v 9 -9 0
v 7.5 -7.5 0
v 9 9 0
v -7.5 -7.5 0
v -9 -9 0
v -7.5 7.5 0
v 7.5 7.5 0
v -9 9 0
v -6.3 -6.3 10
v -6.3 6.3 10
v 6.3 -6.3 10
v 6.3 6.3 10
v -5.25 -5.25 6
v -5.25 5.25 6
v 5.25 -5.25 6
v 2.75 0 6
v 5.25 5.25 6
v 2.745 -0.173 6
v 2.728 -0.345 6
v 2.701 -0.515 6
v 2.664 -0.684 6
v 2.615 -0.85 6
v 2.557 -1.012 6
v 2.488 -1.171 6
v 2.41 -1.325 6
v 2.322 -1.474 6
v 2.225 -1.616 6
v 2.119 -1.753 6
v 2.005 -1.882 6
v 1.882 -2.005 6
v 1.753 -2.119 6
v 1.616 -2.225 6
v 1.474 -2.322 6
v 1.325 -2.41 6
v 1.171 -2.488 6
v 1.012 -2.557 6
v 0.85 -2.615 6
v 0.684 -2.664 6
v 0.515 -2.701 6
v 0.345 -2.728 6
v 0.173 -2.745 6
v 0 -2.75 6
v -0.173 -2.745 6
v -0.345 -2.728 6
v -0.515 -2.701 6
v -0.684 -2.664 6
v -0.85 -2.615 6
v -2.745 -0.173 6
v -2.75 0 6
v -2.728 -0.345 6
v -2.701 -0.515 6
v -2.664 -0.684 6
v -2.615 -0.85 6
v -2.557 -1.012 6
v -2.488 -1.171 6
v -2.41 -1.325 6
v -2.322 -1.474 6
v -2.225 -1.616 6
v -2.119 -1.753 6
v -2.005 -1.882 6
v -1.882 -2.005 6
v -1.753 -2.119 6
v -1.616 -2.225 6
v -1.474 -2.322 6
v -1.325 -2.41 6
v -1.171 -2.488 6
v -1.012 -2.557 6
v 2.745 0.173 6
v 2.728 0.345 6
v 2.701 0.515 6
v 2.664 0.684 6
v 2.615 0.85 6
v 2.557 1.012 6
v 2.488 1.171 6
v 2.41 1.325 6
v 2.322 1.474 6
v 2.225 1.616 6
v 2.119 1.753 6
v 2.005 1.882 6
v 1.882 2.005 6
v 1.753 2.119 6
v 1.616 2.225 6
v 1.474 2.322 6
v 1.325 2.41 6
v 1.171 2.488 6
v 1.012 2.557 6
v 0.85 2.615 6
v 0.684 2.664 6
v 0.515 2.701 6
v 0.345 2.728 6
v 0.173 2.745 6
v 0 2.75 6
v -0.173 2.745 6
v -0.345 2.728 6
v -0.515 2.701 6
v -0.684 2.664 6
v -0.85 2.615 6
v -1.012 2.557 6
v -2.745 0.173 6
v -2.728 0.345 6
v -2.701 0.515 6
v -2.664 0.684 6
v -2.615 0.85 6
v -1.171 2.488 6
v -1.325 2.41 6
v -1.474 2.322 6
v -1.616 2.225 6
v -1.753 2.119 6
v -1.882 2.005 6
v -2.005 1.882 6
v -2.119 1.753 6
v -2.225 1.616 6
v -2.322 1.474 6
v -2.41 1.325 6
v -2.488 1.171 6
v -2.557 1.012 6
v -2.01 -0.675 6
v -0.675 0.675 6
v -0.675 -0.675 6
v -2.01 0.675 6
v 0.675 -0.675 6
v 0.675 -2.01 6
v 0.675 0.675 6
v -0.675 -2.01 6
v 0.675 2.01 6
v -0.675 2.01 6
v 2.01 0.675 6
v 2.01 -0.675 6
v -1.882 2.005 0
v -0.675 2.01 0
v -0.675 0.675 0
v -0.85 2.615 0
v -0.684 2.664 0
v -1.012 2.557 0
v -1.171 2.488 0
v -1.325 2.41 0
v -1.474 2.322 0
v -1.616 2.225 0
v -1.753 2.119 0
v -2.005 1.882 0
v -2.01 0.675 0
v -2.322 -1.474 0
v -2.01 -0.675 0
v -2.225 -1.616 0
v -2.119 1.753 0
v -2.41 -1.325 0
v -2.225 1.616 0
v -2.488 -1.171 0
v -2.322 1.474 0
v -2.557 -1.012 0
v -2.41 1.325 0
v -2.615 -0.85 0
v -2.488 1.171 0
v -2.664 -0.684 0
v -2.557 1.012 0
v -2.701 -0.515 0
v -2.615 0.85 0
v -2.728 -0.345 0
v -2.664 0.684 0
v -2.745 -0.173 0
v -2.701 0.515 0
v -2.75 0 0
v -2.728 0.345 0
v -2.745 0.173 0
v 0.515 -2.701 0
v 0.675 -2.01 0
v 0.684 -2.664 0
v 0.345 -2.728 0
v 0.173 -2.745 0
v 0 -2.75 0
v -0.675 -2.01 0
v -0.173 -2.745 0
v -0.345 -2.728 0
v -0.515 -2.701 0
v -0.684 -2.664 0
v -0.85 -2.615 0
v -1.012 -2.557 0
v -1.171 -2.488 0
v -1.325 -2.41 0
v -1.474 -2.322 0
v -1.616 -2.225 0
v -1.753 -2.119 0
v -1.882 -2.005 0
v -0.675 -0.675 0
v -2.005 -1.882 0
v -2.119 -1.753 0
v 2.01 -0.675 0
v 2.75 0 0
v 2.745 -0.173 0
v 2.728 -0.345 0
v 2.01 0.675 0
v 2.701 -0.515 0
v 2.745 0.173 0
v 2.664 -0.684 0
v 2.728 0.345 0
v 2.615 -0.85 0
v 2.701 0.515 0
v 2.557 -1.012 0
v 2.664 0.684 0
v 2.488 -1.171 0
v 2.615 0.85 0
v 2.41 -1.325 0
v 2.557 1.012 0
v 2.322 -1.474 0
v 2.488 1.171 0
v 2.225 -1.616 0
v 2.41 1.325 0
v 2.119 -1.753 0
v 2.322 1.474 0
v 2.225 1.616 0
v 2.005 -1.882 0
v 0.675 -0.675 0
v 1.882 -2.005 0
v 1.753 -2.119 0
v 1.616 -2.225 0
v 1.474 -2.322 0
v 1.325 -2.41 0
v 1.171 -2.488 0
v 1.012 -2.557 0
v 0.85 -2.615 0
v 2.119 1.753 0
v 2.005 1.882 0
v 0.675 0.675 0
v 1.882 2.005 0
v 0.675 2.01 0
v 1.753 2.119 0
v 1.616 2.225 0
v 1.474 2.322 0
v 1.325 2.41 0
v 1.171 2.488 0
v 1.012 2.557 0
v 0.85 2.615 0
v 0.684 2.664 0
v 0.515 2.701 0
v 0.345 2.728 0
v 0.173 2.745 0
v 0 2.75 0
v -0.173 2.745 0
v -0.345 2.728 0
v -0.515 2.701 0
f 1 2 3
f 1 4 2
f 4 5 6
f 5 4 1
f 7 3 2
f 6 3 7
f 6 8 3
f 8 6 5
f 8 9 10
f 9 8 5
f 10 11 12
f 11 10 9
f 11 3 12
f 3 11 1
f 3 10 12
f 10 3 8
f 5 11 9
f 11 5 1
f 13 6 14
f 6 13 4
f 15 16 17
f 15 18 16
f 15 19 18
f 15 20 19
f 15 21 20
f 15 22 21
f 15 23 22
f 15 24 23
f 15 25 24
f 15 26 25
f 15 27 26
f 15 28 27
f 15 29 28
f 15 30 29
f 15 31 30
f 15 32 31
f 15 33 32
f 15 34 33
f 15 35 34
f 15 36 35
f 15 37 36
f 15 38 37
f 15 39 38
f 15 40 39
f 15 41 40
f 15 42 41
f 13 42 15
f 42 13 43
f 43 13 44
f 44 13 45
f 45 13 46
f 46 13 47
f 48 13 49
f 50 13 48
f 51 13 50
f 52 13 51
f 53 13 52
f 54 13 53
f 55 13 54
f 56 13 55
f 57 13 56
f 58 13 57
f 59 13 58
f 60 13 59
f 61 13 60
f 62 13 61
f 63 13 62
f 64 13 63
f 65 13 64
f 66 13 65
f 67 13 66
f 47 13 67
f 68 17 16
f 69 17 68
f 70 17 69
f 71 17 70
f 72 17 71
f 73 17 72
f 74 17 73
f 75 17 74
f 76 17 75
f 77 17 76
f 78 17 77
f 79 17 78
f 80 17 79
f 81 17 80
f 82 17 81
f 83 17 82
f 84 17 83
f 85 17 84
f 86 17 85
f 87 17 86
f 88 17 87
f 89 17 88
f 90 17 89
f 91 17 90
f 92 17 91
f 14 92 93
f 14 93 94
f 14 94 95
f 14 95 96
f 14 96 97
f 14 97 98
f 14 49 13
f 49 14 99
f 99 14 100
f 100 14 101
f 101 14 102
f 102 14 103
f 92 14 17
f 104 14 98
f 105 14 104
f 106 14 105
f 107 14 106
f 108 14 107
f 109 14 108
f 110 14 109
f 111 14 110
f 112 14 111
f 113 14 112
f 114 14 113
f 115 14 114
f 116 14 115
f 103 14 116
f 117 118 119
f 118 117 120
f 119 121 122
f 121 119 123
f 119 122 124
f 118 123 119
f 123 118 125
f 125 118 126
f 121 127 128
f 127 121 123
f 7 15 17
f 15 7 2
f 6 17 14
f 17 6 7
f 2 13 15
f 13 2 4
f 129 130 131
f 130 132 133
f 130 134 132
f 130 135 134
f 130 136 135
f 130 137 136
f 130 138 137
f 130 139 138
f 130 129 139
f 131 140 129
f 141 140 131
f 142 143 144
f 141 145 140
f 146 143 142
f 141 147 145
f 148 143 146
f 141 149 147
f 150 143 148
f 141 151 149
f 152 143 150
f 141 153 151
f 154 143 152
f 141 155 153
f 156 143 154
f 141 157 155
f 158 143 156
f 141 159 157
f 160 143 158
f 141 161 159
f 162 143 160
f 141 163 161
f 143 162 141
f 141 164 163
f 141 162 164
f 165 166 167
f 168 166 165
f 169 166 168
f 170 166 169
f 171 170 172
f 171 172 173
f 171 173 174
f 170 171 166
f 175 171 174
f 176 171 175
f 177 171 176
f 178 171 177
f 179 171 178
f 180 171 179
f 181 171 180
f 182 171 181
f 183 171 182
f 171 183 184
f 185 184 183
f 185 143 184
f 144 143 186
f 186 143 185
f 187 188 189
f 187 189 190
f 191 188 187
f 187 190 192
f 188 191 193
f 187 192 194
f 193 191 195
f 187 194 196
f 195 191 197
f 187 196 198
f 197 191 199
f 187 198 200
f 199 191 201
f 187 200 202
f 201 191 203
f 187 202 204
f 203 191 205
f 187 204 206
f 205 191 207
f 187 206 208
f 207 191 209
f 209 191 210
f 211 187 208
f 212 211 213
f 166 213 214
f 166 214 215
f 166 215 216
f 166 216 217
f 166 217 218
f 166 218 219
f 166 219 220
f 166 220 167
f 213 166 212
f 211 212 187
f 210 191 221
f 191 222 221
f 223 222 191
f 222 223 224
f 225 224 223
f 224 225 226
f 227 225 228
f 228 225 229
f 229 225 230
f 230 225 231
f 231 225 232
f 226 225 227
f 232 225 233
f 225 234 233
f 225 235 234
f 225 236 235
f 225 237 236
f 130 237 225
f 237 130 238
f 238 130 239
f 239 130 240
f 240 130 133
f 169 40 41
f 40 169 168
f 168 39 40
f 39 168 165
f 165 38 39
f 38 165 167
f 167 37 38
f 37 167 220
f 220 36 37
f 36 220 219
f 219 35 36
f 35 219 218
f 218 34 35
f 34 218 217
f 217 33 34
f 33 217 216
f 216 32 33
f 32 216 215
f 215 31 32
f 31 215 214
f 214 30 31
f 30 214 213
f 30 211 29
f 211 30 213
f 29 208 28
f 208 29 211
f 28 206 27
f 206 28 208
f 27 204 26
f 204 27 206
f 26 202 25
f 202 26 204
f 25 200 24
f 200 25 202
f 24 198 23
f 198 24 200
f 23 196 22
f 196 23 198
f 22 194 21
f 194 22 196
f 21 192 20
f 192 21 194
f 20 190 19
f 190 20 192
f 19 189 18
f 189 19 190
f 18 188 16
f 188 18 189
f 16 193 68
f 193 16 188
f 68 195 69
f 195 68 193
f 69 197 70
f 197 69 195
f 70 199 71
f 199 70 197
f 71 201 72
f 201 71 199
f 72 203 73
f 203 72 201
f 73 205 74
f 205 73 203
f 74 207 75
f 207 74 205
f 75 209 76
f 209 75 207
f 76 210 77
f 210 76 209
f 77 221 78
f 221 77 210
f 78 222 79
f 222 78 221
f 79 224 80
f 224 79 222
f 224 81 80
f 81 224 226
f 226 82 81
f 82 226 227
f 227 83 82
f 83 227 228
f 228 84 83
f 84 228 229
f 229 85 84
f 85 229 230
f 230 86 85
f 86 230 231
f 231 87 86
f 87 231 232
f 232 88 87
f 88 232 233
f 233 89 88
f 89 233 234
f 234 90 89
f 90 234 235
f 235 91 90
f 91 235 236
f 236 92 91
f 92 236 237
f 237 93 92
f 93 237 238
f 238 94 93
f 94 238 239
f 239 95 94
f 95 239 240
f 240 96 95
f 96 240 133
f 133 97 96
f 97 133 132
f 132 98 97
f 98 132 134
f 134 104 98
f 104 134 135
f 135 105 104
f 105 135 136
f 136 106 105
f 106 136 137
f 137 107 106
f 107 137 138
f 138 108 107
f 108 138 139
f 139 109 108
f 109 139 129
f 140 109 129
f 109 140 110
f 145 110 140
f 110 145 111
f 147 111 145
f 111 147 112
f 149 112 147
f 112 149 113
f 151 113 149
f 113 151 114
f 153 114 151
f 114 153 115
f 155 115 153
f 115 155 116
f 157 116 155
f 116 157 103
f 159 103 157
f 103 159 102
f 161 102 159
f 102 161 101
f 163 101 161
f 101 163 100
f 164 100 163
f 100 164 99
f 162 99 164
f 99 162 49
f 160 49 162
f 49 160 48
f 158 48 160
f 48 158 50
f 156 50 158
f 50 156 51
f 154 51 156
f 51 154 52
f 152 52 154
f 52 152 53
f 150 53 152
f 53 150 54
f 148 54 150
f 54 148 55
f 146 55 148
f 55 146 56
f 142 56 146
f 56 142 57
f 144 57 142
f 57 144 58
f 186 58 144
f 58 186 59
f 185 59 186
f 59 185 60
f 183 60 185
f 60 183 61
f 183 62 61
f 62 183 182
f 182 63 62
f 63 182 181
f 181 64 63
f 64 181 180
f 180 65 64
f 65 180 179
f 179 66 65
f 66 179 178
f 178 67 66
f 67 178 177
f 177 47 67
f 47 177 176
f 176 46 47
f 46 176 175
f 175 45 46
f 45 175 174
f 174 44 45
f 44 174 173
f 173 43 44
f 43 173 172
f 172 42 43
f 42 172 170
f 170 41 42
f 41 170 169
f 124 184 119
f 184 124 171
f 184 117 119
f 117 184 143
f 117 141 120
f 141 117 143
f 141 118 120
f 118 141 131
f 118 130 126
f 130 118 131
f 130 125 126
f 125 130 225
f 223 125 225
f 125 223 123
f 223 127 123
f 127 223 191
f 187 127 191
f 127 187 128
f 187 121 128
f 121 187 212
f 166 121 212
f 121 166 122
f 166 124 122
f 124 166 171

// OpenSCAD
module create_keycap(height=10, stem_height=6, wall_thickness=3) {
    //keycap shell
    difference() {
        linear_extrude(height = height, scale = 12.6/18)
            square([18, 18], center = true);
        linear_extrude(height = stem_height, scale = 12.6/18)
            square([18-wall_thickness, 18-wall_thickness], center = true);
    }
    
    //cherrymx stem
    linear_extrude(height=stem_height)
        difference() {
            circle(d=5.5, $fn=100, center=true);
            square([1.35, 4.02], center=true);
            square([4.02, 1.35], center=true);
        }
}

create_keycap();
